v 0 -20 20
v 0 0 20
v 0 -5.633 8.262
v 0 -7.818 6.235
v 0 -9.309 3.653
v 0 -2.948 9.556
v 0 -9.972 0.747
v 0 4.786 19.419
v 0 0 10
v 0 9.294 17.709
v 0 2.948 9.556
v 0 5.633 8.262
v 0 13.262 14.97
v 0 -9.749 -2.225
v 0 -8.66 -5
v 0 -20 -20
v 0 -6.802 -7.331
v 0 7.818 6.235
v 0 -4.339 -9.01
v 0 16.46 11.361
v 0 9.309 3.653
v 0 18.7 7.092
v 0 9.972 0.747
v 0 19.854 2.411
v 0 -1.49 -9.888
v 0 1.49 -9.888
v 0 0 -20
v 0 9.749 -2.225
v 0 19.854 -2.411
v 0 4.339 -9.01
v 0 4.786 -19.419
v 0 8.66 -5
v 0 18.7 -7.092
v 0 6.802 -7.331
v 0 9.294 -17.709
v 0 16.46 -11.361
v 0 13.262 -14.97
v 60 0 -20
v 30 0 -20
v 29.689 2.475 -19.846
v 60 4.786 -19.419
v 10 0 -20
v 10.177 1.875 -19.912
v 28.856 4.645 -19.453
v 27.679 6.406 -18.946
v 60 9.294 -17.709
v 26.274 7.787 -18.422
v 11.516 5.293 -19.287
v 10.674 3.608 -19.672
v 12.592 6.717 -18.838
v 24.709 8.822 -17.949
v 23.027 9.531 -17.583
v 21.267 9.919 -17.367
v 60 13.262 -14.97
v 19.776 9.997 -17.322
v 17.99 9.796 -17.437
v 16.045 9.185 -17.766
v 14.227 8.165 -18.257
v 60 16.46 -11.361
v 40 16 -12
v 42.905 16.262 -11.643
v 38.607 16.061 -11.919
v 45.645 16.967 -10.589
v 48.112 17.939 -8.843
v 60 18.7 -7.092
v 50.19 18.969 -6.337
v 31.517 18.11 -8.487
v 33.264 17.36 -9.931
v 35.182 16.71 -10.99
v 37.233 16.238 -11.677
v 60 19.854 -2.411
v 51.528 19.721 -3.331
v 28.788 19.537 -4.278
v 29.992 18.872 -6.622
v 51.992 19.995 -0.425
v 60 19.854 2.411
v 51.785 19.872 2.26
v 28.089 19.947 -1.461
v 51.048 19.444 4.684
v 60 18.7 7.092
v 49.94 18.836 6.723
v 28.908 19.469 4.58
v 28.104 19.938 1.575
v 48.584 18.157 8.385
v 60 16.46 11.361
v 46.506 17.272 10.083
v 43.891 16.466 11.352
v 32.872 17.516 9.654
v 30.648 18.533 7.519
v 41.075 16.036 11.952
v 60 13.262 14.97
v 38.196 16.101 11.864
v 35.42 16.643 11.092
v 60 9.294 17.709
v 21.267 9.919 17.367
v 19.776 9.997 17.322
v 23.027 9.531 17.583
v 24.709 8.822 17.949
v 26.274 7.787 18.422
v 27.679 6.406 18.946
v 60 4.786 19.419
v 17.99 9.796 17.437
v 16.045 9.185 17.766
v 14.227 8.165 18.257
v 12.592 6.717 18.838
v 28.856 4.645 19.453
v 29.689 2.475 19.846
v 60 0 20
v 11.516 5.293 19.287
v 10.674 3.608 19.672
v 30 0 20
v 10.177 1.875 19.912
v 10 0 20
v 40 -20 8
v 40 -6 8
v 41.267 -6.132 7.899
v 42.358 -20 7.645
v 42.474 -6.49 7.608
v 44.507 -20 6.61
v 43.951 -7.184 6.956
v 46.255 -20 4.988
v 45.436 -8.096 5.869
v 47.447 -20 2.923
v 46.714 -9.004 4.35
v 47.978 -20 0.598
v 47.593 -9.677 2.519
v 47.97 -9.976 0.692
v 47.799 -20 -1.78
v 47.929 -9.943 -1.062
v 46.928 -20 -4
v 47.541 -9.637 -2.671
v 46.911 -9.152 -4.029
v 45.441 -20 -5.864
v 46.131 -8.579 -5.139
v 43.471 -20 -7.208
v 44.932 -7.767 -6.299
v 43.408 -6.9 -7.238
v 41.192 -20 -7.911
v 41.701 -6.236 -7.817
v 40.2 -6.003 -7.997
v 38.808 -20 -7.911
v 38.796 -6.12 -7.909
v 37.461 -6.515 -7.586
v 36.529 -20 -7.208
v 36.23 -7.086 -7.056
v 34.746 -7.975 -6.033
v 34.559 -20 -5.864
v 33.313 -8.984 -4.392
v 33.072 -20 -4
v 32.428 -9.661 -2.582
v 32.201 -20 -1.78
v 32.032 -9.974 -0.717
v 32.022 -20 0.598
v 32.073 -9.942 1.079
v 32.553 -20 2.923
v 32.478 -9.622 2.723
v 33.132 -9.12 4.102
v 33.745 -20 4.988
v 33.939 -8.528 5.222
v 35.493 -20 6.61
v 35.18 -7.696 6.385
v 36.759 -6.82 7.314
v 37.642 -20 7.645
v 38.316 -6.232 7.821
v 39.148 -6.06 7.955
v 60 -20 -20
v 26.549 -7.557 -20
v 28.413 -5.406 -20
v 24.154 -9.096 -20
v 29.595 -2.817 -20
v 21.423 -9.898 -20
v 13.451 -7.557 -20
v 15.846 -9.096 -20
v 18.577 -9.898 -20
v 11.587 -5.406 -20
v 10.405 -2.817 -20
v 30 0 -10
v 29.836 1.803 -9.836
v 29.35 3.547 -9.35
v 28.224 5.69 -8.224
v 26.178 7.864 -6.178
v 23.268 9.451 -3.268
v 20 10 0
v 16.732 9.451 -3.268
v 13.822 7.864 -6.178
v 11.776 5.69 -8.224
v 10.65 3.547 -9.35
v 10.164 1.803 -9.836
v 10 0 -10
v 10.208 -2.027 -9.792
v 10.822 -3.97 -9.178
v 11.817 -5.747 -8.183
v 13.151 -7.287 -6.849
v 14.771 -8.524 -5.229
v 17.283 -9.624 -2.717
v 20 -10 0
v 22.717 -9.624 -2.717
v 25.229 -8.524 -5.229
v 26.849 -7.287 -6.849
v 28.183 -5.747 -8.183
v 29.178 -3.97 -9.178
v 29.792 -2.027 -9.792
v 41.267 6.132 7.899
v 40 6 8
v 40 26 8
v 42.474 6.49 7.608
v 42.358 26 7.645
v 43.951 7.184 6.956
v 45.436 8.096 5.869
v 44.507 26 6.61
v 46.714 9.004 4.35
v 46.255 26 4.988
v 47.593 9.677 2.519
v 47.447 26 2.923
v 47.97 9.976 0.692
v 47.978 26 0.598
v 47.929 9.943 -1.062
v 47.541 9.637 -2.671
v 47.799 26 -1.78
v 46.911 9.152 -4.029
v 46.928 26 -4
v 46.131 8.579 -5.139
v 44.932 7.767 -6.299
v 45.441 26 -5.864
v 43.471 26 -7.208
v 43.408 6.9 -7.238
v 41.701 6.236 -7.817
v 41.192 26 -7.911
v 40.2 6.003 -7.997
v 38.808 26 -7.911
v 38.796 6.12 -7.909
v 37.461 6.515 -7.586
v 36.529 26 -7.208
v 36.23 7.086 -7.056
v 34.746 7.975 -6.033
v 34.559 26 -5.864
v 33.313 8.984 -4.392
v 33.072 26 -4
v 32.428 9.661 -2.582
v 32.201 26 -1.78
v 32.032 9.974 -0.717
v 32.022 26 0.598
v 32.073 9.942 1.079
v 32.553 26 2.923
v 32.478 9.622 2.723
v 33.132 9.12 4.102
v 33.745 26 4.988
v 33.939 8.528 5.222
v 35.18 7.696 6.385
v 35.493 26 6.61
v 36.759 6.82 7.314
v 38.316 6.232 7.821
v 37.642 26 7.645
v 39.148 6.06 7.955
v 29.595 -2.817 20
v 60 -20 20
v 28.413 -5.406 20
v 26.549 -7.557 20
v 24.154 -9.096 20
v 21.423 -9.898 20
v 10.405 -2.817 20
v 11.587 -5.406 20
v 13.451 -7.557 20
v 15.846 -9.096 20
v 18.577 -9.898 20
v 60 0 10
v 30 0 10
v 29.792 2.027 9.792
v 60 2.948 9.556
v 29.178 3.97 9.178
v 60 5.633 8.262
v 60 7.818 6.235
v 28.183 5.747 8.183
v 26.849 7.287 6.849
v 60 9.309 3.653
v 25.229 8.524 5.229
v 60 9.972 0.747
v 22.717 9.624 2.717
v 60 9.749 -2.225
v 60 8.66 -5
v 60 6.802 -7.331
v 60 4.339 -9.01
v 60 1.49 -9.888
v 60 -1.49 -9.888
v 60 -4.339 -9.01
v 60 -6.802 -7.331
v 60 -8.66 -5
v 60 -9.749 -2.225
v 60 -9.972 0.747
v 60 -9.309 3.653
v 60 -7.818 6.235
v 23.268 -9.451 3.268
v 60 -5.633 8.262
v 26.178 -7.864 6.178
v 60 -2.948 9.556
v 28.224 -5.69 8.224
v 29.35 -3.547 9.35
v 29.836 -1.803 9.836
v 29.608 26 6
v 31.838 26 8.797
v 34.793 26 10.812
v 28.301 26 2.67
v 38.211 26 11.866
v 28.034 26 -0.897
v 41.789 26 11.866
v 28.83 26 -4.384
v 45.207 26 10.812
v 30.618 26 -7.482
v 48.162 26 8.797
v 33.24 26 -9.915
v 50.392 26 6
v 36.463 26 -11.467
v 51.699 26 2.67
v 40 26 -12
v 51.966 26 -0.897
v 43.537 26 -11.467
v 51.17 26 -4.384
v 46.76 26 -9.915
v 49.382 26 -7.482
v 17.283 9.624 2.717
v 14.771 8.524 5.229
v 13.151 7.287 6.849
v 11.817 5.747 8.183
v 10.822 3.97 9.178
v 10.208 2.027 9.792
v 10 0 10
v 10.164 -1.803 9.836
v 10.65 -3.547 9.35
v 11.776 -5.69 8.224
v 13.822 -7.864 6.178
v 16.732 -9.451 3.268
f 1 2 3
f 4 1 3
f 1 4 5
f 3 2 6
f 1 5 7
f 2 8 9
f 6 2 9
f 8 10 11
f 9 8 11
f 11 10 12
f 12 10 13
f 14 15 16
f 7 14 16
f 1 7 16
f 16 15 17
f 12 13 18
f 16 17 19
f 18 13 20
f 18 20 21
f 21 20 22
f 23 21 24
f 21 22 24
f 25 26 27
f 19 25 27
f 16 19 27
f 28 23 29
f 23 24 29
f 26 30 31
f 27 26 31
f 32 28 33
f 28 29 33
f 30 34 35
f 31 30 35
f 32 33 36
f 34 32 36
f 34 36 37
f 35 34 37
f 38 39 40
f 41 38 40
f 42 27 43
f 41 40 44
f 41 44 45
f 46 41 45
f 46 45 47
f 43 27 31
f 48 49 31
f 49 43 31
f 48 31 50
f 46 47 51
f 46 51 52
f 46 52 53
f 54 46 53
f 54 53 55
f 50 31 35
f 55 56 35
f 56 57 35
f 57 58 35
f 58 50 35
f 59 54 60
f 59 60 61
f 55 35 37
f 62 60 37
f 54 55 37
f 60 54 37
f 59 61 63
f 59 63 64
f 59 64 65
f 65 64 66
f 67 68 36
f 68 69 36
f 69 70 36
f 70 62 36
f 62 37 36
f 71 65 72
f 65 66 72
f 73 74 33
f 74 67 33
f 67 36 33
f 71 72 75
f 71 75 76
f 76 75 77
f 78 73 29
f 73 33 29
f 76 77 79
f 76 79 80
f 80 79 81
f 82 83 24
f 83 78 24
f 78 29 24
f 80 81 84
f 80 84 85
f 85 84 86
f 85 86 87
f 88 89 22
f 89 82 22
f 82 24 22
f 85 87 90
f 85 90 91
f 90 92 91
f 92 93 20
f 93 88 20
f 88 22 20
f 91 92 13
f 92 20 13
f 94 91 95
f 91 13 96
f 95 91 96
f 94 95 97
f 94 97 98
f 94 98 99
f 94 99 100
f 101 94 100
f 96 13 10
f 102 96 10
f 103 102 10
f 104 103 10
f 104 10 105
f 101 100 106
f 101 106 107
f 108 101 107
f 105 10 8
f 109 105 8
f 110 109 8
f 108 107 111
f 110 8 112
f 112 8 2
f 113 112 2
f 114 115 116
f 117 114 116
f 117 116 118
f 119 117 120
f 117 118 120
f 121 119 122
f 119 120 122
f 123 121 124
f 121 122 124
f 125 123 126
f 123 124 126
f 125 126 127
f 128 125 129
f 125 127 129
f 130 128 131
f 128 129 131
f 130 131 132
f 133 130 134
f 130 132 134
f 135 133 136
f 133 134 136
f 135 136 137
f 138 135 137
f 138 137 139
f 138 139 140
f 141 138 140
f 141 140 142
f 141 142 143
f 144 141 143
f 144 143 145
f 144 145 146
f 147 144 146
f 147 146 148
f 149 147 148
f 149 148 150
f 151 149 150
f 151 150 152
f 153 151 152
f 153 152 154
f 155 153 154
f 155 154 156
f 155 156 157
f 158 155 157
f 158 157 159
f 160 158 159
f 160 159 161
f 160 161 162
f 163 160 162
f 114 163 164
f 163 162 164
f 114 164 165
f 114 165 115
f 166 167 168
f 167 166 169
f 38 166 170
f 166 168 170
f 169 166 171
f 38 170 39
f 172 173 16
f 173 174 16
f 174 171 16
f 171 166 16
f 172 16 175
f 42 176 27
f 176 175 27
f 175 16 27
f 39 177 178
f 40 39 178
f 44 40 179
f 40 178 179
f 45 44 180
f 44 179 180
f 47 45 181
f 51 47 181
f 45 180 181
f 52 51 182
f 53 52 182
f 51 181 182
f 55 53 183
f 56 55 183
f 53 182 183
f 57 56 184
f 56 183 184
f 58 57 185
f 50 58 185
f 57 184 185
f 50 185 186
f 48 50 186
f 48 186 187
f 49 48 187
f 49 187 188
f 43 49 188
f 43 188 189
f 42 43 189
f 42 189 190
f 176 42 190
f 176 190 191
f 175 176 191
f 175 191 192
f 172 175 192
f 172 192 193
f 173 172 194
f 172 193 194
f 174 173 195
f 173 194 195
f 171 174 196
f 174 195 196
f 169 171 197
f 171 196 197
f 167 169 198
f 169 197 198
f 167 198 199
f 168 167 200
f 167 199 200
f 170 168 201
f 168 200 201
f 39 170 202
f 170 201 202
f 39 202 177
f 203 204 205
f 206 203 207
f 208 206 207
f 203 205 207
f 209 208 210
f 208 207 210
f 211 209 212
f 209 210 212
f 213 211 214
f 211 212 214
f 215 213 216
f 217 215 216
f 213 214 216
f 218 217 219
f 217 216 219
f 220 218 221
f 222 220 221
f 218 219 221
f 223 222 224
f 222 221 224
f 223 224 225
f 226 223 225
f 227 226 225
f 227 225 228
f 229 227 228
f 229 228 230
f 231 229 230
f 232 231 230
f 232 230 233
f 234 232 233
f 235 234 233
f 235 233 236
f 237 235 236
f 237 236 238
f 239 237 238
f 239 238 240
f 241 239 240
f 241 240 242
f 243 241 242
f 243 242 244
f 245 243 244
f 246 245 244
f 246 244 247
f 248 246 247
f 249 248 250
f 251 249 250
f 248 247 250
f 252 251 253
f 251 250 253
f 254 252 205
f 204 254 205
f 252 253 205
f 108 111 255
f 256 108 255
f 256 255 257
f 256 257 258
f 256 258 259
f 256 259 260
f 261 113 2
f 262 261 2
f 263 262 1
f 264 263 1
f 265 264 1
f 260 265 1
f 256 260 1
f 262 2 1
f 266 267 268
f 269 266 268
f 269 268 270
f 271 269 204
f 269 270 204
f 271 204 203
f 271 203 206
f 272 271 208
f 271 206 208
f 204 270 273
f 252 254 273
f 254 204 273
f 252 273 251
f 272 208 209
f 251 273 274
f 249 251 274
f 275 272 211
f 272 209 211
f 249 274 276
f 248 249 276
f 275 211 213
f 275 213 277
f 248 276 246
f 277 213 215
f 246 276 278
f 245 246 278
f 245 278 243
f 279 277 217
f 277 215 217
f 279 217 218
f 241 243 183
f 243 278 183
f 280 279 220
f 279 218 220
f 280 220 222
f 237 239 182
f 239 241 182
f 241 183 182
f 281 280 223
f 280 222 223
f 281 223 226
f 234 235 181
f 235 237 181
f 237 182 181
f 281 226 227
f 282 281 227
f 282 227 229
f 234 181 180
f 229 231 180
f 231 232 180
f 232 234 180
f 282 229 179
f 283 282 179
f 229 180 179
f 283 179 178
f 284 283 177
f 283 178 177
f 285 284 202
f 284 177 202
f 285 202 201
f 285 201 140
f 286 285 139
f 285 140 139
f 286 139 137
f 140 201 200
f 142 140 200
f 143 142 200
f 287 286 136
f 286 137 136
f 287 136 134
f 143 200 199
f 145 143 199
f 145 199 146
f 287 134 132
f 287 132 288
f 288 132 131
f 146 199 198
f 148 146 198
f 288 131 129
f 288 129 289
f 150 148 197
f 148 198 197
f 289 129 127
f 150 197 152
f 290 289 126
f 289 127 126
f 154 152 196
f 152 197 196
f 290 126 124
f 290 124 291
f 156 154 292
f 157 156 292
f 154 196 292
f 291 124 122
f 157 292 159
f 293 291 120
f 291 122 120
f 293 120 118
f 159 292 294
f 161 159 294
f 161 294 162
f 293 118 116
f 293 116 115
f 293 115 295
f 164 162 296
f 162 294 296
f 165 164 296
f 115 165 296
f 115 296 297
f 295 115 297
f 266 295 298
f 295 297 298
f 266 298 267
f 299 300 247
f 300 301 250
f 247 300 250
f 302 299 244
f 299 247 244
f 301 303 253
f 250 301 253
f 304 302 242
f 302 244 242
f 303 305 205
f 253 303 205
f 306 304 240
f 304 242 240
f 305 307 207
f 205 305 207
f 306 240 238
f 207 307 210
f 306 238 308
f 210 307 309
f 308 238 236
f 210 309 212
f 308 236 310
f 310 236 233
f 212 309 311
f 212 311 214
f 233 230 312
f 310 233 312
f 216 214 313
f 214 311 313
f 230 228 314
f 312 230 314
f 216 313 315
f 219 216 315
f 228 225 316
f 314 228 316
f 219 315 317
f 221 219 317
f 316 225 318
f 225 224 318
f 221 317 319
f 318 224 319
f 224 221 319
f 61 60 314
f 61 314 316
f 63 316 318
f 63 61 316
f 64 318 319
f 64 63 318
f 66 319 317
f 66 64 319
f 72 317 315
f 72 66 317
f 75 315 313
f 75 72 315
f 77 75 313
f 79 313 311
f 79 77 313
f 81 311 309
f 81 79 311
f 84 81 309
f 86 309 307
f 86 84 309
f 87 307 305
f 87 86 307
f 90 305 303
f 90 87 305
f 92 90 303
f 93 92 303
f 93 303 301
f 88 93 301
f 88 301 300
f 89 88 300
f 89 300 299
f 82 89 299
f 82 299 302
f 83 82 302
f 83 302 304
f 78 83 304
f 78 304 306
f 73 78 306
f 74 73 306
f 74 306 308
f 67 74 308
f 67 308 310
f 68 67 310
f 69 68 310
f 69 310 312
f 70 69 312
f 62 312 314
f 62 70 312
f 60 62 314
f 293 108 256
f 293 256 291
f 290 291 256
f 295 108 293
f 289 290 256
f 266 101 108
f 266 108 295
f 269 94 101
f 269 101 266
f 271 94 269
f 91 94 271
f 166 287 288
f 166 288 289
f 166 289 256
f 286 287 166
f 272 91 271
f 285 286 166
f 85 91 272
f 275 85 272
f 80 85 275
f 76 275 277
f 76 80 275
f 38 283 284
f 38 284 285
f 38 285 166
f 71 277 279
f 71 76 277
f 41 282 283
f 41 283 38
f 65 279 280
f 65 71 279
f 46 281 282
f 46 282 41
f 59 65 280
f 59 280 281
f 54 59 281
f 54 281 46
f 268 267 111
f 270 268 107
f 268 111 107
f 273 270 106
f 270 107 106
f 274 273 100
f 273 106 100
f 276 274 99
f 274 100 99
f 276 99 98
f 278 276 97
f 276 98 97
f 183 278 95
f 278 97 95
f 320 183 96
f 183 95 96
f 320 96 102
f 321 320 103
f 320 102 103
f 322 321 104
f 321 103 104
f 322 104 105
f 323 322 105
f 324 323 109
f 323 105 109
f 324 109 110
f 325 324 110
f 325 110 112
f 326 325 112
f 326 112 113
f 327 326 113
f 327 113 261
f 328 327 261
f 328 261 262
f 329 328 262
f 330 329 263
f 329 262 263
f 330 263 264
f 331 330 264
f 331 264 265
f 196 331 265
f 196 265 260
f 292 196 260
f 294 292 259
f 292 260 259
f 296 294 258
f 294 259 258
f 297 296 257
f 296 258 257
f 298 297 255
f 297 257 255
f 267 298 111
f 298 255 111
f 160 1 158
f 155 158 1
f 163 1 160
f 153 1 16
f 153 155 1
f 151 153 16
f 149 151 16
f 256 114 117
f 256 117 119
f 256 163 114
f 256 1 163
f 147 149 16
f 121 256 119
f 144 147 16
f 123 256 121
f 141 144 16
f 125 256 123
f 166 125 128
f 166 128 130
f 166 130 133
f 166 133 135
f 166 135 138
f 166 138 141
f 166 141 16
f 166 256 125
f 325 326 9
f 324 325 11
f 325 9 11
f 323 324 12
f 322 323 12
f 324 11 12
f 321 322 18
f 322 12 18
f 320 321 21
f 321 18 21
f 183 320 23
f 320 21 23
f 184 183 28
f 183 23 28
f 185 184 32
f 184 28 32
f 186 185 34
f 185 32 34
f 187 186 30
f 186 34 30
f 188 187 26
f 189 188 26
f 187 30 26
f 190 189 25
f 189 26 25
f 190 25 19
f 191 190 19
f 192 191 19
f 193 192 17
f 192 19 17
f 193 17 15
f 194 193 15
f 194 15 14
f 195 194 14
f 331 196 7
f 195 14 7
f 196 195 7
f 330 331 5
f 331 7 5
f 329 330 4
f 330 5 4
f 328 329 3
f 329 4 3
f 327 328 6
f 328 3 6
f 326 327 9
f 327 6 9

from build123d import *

# Parameters (mm, degrees)
EXTRUDE_1_DEPTH     = 60
SKETCH_3_R          = 12
EXTRUDE_2_DEPTH     = 46
SKETCH_6_R          = 10
CUT_EXTRUDE_1_DEPTH = 69.381284144
SKETCH_7_R          = 8
CUT_EXTRUDE_2_DEPTH = 79.204859286
SKETCH_8_R          = 10
CUT_EXTRUDE_3_DEPTH = 77.655071751


with BuildPart() as part:
    # 草图1 → 凸台-拉伸1 (new body)
    with BuildSketch(Plane(origin=(0, 0, 0), x_dir=(0, 0, -1), z_dir=(1, 0, 0))):
        with BuildLine():
            Line((-20, 0), (-20, -20))
            Line((-20, -20), (20, -20))
            Line((20, -20), (20, 0))
            ThreePointArc((20, 0), (0, 20), (-20, 0))
        make_face()
    extrude(amount=EXTRUDE_1_DEPTH)

    # 草图3 → 凸台-拉伸2 (add)
    with BuildSketch(Plane(origin=(0, -20, 0), x_dir=(-1, 0, 0), z_dir=(0, -1, 0))):
        with Locations(Location((-40, 0, 0), (0, 0, 90))):
            Circle(SKETCH_3_R)
    extrude(amount=-EXTRUDE_2_DEPTH)

    # 草图6 → 切除-拉伸1 (cut, through all)
    with BuildSketch(Plane.ZY):
        Circle(SKETCH_6_R)
    extrude(amount=-CUT_EXTRUDE_1_DEPTH, mode=Mode.SUBTRACT)

    # 草图7 → 切除-拉伸2 (cut, through all)
    with BuildSketch(Plane(origin=(0, 26, 0), x_dir=(1, 0, 0), z_dir=(0, 1, 0))):
        with Locations(Location((40, 0, 0), (0, 0, 270))):
            Circle(SKETCH_7_R)
    extrude(amount=-CUT_EXTRUDE_2_DEPTH, mode=Mode.SUBTRACT)

    # 草图8 → 切除-拉伸3 (cut, through all)
    with BuildSketch(Plane.XY.offset(20)):
        with Locations((20, 0)):
            Circle(SKETCH_8_R)
    extrude(amount=-CUT_EXTRUDE_3_DEPTH, mode=Mode.SUBTRACT)


solid = part.part
